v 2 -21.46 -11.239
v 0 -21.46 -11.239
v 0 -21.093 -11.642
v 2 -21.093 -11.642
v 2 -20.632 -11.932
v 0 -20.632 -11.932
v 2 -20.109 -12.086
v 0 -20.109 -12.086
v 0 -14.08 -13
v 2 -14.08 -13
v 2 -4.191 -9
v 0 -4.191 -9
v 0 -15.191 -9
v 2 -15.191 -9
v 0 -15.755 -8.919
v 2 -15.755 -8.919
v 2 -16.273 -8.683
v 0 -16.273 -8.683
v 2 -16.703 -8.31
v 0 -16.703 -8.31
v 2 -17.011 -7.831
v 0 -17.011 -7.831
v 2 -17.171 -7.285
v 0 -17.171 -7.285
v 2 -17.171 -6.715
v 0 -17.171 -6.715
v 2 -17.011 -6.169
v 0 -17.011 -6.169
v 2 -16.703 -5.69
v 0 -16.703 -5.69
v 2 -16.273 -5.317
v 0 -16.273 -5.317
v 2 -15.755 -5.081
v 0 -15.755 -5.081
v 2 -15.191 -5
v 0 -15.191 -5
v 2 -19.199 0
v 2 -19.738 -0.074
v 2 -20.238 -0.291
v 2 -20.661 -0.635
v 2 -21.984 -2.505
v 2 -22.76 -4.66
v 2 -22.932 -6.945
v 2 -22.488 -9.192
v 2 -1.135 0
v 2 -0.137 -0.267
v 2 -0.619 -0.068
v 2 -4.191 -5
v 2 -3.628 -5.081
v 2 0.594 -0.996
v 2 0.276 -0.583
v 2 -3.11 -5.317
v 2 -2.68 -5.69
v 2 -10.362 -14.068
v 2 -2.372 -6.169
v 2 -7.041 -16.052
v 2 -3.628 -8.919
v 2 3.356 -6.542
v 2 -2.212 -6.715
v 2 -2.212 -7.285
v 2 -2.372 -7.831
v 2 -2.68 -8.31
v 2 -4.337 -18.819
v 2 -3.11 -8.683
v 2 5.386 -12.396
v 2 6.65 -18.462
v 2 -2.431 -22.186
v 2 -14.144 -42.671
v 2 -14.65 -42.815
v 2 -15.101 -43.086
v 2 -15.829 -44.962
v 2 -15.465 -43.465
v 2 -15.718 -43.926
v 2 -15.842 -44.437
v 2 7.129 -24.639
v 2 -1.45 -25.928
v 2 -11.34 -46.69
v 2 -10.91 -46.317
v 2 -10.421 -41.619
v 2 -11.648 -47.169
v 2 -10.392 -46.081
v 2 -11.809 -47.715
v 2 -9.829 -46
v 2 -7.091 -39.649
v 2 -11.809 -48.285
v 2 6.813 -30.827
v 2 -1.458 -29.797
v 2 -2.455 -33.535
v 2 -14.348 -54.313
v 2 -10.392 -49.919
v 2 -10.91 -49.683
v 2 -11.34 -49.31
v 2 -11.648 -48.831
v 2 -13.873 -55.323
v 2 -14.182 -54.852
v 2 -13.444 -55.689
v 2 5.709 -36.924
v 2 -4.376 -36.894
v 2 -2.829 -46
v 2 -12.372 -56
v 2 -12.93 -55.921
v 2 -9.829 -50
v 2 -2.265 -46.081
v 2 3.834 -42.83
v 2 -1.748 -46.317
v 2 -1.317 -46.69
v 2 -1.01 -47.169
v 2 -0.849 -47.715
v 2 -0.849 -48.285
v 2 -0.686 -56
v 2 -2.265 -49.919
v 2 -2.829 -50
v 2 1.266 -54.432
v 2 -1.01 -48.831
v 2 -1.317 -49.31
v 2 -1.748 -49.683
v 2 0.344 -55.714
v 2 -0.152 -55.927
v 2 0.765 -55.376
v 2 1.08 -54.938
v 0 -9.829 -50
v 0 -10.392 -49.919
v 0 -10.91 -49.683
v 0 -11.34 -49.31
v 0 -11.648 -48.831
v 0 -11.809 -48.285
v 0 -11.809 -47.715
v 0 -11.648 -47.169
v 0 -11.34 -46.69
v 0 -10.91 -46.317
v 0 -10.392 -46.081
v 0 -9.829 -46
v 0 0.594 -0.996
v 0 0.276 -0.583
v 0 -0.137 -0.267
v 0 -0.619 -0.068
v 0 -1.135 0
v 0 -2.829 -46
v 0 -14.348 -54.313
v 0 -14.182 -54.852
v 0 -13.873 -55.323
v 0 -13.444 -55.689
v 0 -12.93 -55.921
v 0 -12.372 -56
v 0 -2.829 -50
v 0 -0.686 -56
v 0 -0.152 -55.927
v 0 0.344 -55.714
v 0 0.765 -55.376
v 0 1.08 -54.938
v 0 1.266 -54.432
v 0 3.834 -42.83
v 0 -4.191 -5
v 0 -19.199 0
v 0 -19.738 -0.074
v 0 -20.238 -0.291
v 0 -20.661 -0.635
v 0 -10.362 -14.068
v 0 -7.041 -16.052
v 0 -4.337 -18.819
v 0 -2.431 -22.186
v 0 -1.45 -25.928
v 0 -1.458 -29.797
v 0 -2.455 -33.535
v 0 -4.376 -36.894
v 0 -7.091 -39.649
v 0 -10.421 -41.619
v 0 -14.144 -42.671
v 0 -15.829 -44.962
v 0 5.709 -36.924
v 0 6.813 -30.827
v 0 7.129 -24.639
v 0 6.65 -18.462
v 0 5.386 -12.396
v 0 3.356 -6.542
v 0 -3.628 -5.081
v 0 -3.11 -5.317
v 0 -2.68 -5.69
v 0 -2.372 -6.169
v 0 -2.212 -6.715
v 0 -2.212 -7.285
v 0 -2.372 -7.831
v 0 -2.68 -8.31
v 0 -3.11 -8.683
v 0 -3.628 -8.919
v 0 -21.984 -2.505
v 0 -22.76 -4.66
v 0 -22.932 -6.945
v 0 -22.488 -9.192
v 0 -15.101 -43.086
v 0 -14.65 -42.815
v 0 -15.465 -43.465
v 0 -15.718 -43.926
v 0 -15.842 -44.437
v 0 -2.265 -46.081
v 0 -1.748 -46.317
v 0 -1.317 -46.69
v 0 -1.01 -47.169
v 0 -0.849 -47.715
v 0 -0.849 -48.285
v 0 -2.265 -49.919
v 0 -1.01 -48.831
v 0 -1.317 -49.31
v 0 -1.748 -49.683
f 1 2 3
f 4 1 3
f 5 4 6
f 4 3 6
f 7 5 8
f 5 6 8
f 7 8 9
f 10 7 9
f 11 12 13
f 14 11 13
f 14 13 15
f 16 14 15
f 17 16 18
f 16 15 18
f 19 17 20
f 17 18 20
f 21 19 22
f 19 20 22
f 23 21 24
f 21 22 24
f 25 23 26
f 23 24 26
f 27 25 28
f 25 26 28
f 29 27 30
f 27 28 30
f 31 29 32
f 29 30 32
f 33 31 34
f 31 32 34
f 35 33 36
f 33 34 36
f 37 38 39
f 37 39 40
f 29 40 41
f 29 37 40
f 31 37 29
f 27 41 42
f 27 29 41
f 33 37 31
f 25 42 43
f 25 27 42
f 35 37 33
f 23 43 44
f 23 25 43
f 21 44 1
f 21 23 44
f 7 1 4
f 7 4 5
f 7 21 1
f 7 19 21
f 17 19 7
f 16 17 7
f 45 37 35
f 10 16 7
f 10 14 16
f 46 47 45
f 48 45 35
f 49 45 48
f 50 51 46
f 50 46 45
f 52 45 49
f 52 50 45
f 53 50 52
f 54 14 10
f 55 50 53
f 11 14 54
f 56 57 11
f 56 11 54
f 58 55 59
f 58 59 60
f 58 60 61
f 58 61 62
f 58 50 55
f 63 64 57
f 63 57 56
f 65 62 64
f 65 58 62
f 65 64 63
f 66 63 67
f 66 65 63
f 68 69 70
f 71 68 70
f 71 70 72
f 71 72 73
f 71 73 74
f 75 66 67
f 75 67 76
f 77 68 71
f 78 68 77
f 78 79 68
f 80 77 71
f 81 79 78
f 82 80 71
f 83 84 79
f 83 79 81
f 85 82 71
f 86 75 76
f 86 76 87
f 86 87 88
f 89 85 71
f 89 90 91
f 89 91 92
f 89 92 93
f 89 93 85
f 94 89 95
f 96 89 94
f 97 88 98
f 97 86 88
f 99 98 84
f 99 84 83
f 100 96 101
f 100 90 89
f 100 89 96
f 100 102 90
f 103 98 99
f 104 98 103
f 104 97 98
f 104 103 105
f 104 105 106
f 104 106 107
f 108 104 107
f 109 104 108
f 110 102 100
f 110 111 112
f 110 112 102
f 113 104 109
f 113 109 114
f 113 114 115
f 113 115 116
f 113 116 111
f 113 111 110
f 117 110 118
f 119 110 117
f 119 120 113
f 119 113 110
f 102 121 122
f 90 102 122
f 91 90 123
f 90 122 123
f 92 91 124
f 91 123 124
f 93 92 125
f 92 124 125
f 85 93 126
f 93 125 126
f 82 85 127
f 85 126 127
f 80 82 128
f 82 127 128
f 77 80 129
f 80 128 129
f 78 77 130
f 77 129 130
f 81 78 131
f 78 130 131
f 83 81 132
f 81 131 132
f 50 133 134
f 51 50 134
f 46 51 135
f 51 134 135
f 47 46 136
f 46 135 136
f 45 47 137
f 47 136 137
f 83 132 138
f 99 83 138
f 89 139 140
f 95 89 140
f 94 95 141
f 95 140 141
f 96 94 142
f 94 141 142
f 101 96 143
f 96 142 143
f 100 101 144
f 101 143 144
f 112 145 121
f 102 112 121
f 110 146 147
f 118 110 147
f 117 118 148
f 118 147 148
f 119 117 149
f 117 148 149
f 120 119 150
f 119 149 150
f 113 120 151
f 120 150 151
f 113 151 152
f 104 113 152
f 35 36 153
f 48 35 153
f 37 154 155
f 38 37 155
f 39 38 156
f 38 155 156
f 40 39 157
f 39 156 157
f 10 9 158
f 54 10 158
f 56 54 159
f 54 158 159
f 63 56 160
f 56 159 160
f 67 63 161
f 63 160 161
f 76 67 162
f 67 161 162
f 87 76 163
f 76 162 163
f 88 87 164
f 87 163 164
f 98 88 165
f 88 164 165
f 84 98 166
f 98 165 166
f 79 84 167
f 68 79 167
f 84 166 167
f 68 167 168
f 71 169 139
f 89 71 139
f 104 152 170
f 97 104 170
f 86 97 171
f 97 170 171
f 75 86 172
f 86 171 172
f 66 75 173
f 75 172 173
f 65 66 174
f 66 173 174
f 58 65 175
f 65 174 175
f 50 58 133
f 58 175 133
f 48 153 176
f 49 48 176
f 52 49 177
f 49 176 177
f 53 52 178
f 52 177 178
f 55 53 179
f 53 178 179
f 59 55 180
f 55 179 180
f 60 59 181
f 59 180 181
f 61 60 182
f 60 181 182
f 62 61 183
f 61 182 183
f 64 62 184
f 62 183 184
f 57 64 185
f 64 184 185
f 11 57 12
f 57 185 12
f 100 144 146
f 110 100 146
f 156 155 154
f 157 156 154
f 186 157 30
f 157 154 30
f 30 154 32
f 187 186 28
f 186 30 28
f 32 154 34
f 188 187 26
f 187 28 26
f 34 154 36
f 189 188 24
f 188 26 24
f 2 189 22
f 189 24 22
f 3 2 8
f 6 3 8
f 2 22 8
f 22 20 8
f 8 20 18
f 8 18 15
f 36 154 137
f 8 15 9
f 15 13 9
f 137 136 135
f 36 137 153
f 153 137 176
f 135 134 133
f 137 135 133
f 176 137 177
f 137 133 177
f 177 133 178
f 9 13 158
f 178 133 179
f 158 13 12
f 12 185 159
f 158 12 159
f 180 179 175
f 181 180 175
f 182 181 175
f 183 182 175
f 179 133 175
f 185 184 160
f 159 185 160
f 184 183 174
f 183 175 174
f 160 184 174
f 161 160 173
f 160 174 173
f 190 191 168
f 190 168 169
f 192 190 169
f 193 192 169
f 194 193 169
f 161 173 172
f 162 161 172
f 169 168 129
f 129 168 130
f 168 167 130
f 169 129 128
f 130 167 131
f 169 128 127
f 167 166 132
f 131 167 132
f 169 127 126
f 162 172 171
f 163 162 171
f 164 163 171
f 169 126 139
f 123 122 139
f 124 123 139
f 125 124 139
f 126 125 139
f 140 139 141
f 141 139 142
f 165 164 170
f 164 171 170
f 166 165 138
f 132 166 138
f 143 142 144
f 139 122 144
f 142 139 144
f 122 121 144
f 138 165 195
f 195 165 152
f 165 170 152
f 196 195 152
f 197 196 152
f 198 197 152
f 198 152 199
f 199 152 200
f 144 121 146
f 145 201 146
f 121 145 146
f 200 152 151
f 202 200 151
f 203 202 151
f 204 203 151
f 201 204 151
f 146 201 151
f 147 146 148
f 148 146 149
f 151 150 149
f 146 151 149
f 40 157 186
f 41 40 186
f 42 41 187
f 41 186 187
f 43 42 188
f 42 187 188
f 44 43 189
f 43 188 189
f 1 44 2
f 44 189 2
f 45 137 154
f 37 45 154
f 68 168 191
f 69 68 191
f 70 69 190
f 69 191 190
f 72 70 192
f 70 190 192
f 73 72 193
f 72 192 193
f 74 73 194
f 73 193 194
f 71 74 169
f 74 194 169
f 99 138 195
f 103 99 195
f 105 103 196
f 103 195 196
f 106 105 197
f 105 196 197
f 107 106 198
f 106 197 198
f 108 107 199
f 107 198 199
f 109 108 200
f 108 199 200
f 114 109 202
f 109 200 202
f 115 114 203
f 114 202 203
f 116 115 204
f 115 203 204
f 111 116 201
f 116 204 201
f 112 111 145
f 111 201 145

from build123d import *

# Parameters (mm, degrees)
RESSALTO_EXTRUS_O1_DEPTH = 2


with BuildPart() as part:
    # Esboço1 → Ressalto-extrusão1 (new body)
    with BuildSketch(Plane(origin=(0, 0, 0), x_dir=(0, 0, -1), z_dir=(1, 0, 0))):
        with BuildLine():
            Line((0, -1.135256663), (0, -19.198580097))
            ThreePointArc((0, -19.198580097), (0.165672539, -19.99560128), (0.635242767, -20.66057794))
            ThreePointArc((0.635242767, -20.66057794), (5.79673997, -22.923055217), (11.239007951, -21.459642756))
            ThreePointArc((11.239007951, -21.459642756), (11.802930255, -20.872546688), (12.086175338, -20.109354458))
            Line((12.086175338, -20.109354458), (13, -14.080459117))
            ThreePointArc((13, -14.080459117), (27.8629628, -1.328429998), (42.670766881, -14.144468704))
            ThreePointArc((42.670766881, -14.144468704), (43.465031593, -15.464843047), (44.962324336, -15.8286552))
            Line((44.962324336, -15.8286552), (54.31286893, -14.347674427))
            ThreePointArc((54.31286893, -14.347674427), (55.520811931, -13.671193843), (56, -12.372297746))
            Line((56, -12.372297746), (56, -0.68631259))
            ThreePointArc((56, -0.68631259), (55.559508665, 0.565858613), (54.432067277, 1.266459252))
            Line((54.432067277, 1.266459252), (42.829728449, 3.833574795))
            ThreePointArc((42.829728449, 3.833574795), (21.542961045, 6.988627316), (0.995627431, 0.594262271))
            ThreePointArc((0.995627431, 0.594262271), (0.2666874, -0.137445342), (0, -1.135256663))
        make_face()
        with BuildLine():
            Line((9, -4.191253682), (9, -15.191253682))
            ThreePointArc((9, -15.191253682), (7, -17.191253682), (5, -15.191253682))
            Line((5, -15.191253682), (5, -4.191253682))
            ThreePointArc((5, -4.191253682), (7, -2.191253682), (9, -4.191253682))
        make_face(mode=Mode.SUBTRACT)
        with BuildLine():
            Line((50, -2.828963065), (50, -9.828963065))
            ThreePointArc((50, -9.828963065), (48, -11.828963065), (46, -9.828963065))
            Line((46, -9.828963065), (46, -2.828963065))
            ThreePointArc((46, -2.828963065), (48, -0.828963065), (50, -2.828963065))
        make_face(mode=Mode.SUBTRACT)
    extrude(amount=RESSALTO_EXTRUS_O1_DEPTH)


solid = part.part
